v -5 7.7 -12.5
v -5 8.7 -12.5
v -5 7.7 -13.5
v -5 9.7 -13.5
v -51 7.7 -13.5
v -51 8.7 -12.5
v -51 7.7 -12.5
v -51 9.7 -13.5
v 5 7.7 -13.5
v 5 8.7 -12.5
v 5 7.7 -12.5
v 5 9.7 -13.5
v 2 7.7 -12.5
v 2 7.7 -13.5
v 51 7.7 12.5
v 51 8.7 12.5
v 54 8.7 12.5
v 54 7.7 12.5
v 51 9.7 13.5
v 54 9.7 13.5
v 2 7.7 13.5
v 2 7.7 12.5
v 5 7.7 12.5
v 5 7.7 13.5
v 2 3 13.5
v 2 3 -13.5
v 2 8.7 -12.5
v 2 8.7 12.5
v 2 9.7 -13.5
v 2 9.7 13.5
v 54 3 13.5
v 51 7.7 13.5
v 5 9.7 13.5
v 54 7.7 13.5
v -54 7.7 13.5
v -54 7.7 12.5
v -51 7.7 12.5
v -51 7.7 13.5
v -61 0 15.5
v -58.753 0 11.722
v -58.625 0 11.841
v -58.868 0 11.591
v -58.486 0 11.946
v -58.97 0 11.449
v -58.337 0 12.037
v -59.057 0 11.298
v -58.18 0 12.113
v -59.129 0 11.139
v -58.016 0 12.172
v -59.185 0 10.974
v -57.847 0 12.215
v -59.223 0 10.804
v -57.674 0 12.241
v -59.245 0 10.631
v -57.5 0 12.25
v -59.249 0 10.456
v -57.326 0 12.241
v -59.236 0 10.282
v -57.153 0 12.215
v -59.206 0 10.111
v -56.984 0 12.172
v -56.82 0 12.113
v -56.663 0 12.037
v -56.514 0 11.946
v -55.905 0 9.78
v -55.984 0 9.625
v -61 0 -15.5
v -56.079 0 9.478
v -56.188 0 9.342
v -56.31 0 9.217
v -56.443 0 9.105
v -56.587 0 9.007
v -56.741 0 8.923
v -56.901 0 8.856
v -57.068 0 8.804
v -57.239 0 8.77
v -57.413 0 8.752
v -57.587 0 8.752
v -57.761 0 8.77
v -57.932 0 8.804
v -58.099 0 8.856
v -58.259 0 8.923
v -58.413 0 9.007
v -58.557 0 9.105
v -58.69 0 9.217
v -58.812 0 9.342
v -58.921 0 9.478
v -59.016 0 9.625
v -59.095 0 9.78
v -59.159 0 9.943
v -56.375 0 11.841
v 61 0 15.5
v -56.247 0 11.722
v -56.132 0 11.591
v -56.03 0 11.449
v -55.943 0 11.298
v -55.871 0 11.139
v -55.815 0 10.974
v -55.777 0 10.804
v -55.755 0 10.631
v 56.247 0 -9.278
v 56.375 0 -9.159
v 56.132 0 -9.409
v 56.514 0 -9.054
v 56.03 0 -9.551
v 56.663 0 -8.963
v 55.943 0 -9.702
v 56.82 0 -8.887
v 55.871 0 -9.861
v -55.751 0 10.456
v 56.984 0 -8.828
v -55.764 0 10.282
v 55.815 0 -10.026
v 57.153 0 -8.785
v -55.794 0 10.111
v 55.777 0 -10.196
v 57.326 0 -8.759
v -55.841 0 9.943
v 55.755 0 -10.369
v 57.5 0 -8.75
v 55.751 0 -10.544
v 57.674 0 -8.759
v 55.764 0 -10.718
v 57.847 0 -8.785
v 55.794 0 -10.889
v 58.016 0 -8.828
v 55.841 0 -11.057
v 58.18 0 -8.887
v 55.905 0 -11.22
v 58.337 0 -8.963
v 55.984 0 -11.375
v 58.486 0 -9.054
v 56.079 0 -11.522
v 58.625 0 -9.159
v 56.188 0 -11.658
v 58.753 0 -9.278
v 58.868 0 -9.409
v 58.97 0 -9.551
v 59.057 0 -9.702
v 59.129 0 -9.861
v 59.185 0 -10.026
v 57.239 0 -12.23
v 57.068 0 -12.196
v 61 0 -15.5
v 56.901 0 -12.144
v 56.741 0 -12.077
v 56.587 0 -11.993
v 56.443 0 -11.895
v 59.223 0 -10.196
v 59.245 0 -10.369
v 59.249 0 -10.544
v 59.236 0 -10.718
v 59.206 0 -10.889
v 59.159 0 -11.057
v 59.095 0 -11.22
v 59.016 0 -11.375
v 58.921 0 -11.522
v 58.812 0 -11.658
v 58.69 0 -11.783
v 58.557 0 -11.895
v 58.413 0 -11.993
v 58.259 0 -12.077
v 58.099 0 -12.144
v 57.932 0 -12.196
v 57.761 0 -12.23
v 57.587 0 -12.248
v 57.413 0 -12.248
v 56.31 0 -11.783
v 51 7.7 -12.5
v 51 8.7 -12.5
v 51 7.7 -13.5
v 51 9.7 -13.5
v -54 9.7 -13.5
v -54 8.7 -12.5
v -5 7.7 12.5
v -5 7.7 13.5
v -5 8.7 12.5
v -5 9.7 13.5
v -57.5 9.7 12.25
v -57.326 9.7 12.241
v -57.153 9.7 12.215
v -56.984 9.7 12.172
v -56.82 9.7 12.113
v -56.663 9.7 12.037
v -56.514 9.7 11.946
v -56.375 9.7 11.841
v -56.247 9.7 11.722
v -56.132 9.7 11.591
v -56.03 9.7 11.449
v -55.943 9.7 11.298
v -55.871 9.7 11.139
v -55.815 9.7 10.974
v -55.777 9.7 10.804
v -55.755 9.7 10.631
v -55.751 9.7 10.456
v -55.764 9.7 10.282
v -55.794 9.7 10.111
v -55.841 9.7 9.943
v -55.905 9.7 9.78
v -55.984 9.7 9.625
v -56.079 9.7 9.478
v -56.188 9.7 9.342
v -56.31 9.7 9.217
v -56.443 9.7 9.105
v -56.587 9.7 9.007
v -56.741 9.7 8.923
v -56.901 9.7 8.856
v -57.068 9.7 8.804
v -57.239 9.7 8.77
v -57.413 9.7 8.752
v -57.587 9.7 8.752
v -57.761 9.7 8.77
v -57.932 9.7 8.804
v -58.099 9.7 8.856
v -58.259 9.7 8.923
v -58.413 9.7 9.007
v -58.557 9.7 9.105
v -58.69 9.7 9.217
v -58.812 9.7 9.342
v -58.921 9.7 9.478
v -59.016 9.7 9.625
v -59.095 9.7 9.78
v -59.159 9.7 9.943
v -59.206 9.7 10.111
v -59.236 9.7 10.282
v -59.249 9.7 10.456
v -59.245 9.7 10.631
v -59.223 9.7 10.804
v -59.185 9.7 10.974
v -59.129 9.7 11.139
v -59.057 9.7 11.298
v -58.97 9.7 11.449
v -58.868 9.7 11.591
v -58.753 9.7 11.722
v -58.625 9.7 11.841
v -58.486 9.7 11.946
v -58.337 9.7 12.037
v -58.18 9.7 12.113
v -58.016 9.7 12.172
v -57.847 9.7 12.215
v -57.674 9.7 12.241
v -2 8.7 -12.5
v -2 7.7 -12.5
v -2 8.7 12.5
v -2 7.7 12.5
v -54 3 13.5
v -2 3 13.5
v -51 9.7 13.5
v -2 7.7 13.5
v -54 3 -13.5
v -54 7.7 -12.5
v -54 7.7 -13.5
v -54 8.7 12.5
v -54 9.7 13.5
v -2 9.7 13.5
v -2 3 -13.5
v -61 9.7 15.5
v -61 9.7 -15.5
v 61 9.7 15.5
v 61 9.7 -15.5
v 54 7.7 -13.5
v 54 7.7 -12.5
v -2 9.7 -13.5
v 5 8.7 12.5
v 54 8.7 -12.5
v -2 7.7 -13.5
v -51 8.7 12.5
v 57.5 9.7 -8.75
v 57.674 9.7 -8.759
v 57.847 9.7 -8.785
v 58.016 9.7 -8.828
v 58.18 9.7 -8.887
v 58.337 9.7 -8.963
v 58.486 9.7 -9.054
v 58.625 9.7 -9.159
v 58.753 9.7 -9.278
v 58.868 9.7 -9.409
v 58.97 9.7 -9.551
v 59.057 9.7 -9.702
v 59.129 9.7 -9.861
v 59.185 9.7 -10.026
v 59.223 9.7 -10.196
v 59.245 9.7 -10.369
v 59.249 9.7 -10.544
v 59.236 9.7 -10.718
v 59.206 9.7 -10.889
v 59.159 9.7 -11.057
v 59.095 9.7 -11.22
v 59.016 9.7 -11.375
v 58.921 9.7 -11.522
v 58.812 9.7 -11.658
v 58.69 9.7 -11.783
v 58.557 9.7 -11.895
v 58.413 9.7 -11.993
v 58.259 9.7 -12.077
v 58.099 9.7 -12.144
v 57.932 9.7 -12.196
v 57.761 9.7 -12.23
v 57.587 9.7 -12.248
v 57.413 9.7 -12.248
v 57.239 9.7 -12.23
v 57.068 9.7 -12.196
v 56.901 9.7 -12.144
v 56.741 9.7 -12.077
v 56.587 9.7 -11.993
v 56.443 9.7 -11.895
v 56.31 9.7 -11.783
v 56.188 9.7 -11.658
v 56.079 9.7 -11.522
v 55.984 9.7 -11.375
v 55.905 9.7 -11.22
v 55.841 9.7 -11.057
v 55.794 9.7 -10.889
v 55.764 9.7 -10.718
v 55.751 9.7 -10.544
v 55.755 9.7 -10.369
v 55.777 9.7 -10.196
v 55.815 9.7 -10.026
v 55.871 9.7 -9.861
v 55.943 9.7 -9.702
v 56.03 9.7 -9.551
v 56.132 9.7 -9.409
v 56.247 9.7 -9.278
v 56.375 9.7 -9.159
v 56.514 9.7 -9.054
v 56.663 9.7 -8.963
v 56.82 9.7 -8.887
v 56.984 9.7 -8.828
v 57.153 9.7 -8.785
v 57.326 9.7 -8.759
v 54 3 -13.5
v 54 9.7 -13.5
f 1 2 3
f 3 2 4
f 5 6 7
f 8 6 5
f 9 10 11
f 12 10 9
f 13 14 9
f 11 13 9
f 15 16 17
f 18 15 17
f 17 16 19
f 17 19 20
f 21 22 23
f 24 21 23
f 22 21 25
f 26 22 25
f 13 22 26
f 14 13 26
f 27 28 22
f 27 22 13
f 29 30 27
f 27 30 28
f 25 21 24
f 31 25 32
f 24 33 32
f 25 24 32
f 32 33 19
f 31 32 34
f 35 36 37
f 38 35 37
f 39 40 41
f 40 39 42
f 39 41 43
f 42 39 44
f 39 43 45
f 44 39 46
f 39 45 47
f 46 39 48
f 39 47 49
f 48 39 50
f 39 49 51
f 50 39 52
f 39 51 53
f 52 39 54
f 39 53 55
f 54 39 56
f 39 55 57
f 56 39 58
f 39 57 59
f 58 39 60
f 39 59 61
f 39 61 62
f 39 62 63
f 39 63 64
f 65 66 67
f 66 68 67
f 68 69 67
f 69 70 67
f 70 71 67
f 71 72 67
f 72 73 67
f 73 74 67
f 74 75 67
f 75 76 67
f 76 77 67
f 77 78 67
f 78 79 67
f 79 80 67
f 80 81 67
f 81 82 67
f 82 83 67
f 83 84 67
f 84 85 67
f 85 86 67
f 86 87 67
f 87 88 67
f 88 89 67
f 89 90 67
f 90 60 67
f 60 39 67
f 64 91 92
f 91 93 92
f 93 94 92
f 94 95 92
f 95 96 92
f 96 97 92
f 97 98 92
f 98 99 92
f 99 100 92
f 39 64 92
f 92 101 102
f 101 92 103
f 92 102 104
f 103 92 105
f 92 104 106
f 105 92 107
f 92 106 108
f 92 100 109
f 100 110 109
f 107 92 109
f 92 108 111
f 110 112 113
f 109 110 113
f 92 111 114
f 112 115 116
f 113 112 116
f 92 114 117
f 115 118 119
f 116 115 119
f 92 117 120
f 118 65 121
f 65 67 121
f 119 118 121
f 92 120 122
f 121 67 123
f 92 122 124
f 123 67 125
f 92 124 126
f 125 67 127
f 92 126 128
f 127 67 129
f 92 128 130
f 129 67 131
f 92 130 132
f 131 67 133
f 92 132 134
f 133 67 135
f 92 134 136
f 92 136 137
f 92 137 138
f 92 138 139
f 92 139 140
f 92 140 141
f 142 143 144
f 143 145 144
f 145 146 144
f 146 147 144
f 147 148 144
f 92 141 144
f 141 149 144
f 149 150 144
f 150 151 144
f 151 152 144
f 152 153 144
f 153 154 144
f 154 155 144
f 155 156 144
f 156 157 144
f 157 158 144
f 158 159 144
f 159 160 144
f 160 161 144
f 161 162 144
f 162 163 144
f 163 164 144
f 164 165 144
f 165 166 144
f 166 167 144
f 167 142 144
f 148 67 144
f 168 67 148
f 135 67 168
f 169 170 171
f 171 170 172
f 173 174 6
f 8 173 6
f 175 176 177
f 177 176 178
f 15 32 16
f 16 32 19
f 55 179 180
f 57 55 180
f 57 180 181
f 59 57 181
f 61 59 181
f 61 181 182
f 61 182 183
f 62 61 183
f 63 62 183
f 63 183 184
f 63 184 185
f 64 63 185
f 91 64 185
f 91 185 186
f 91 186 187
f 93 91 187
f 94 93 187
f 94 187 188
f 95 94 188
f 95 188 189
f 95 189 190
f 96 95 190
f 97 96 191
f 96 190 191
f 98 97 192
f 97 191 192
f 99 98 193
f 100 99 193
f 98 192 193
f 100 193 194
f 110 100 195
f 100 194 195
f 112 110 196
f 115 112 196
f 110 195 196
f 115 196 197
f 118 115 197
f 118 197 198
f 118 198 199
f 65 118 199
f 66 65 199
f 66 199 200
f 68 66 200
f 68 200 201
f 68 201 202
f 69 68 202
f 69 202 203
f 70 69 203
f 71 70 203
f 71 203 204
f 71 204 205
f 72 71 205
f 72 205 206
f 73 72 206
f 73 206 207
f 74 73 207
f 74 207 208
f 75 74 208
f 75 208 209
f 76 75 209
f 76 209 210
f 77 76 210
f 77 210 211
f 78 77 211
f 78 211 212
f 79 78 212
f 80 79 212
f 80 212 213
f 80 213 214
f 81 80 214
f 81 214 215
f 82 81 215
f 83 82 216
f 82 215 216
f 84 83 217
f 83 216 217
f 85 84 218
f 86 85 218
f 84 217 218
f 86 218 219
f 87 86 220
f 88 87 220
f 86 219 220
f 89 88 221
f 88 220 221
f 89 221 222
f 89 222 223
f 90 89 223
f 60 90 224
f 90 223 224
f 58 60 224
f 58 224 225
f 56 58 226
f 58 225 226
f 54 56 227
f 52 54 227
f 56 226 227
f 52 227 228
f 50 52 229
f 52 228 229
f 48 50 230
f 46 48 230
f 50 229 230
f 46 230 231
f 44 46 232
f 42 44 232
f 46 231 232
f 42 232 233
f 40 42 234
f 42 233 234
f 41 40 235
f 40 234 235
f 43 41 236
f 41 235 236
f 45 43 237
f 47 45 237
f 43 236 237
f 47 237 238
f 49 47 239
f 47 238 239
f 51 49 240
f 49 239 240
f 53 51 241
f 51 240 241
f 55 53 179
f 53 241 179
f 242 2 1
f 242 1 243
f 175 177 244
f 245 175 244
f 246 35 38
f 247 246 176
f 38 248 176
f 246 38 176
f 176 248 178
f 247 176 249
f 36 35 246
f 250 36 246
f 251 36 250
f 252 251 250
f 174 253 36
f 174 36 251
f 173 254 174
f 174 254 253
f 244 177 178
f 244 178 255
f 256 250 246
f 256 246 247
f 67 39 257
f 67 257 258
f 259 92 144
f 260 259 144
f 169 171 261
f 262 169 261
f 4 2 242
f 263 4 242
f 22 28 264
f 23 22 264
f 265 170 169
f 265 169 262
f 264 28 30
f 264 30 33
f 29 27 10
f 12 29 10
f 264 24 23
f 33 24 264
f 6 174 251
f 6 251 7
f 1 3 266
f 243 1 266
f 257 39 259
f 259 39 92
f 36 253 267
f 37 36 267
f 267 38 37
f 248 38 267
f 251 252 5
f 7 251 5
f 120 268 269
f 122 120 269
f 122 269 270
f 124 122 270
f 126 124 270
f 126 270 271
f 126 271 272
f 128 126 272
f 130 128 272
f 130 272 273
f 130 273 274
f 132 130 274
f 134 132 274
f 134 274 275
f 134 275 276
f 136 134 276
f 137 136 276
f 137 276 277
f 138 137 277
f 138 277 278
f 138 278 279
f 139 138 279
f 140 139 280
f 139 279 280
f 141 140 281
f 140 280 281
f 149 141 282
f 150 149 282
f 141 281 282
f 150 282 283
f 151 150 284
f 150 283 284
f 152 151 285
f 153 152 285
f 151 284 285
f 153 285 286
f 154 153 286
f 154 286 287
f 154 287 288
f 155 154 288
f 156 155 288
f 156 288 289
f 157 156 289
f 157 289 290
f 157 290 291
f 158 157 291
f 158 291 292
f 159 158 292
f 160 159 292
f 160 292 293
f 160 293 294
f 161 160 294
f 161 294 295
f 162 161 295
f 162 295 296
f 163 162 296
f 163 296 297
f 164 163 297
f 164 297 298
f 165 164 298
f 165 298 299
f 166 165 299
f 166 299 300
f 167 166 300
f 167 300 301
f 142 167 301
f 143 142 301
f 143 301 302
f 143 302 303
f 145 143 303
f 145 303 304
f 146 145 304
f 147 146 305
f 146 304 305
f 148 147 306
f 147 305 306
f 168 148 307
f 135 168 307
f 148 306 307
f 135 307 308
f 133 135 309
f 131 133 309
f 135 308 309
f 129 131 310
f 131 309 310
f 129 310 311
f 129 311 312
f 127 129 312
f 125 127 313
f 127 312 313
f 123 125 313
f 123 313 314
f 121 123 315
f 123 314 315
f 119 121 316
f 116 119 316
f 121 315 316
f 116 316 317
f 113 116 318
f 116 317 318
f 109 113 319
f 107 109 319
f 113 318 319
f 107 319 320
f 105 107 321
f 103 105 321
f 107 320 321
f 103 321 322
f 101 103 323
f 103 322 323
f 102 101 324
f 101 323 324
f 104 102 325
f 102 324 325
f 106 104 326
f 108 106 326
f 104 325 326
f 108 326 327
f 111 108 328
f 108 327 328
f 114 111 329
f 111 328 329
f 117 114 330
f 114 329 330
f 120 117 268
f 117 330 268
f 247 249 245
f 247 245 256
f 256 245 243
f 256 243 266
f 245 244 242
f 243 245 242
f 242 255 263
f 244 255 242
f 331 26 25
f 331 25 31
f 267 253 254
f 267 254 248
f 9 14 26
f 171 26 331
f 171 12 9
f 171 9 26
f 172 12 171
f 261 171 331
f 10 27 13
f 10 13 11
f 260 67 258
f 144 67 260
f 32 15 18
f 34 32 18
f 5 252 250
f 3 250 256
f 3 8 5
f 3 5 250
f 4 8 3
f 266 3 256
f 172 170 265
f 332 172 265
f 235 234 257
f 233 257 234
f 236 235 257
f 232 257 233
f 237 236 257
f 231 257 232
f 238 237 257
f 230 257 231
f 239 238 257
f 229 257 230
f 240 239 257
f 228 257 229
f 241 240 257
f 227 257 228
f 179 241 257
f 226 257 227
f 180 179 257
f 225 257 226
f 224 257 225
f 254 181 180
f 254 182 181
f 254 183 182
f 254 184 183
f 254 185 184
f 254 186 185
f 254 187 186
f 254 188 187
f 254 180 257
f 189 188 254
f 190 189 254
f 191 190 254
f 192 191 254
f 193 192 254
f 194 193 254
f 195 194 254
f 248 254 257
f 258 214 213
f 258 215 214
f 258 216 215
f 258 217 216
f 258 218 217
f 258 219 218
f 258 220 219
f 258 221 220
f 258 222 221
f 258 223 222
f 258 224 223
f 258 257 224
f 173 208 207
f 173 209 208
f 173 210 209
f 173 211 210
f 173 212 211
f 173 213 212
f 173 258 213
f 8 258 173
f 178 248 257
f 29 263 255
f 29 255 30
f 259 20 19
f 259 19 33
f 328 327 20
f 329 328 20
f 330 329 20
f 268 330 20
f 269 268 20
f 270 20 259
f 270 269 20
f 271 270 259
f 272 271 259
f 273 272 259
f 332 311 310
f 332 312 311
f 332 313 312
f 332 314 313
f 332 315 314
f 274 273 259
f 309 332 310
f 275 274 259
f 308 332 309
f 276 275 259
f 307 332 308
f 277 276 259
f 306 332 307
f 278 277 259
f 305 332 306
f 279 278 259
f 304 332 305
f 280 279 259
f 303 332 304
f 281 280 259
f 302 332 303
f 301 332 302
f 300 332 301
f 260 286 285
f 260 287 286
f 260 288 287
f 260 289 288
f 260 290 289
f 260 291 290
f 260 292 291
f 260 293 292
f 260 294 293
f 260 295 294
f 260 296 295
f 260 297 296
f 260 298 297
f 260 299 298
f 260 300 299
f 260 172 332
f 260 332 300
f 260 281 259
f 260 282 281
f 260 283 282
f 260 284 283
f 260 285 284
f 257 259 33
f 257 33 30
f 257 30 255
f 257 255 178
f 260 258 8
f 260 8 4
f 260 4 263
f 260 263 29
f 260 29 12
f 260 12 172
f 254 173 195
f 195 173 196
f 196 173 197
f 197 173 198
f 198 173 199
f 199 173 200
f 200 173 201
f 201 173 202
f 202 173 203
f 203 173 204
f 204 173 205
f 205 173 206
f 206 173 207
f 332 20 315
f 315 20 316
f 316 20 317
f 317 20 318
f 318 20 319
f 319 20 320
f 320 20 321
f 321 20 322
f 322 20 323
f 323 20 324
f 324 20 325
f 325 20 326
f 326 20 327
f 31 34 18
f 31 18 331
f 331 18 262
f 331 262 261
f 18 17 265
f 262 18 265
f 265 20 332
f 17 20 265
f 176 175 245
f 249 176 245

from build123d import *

# Parameters (mm, degrees)
SKETCH1_W           = 122
SKETCH1_H           = 31
BOSS_EXTRUDE1_DEPTH = 9.7
SKETCH3_W           = 52
SKETCH3_H           = 27
CUT_EXTRUDE2_DEPTH  = 6.7
SKETCH4_W           = 3
SKETCH4_H           = 3
BOSS_EXTRUDE2_DEPTH = 2
CHAMFER1_SIZE       = 1
SKETCH5_R           = 1.75
CUT_EXTRUDE3_DEPTH  = 64.681551489


with BuildPart() as part:
    # Sketch1 → Boss-Extrude1 (new body)
    with BuildSketch(Plane(origin=(0, 0, 0), x_dir=(1, 0, 0), z_dir=(0, 1, 0))):
        Rectangle(SKETCH1_W, SKETCH1_H)
    extrude(amount=BOSS_EXTRUDE1_DEPTH)

    # Sketch3 → Cut-Extrude2 (cut)
    with BuildSketch(Plane(origin=(0, 9.7, 0), x_dir=(1, 0, 0), z_dir=(0, 1, 0))):
        with Locations((-28, 0)):
            Rectangle(SKETCH3_W, SKETCH3_H)
        with Locations((28, 0)):
            Rectangle(SKETCH3_W, SKETCH3_H)
    extrude(amount=-CUT_EXTRUDE2_DEPTH, mode=Mode.SUBTRACT)

    # Sketch4 → Boss-Extrude2 (add)
    with BuildSketch(Plane(origin=(0, 9.7, 0), x_dir=(1, 0, 0), z_dir=(0, 1, 0))):
        with Locations((-52.5, 14)):
            Rectangle(SKETCH4_W, SKETCH4_H)
        with Locations((-3.5, 14)):
            Rectangle(SKETCH4_W, SKETCH4_H)
        with Locations((-3.5, -14)):
            Rectangle(SKETCH4_W, SKETCH4_H)
        with Locations((-52.5, -14)):
            Rectangle(SKETCH4_W, SKETCH4_H)
        with Locations((52.5, -14)):
            Rectangle(SKETCH4_W, SKETCH4_H)
        with Locations((3.5, -14)):
            Rectangle(SKETCH4_W, SKETCH4_H)
        with Locations((3.5, 14)):
            Rectangle(SKETCH4_W, SKETCH4_H)
        with Locations((52.5, 14)):
            Rectangle(SKETCH4_W, SKETCH4_H)
    extrude(amount=-BOSS_EXTRUDE2_DEPTH)

    # Chamfer1
    chamfer1_edges = [part.edges().sort_by_distance(p)[0] for p in [
        (-52.5, 9.7, 12.5),
        (-3.5, 9.7, 12.5),
        (52.5, 9.7, 12.5),
        (3.5, 9.7, 12.5),
        (52.5, 9.7, -12.5),
        (3.5, 9.7, -12.5),
        (-3.5, 9.7, -12.5),
        (-52.5, 9.7, -12.5),
    ]]
    chamfer(chamfer1_edges, length=CHAMFER1_SIZE)

    # Sketch5 → Cut-Extrude3 (cut, through all)
    with BuildSketch(Plane(origin=(0, 9.7, 0), x_dir=(1, 0, 0), z_dir=(0, 1, 0))):
        with Locations(Location((-57.5, -10.5, 0), (0, 0, 270))):
            Circle(SKETCH5_R)
        with Locations(Location((57.5, 10.5, 0), (0, 0, 270))):
            Circle(SKETCH5_R)
    extrude(amount=-CUT_EXTRUDE3_DEPTH, mode=Mode.SUBTRACT)


solid = part.part
